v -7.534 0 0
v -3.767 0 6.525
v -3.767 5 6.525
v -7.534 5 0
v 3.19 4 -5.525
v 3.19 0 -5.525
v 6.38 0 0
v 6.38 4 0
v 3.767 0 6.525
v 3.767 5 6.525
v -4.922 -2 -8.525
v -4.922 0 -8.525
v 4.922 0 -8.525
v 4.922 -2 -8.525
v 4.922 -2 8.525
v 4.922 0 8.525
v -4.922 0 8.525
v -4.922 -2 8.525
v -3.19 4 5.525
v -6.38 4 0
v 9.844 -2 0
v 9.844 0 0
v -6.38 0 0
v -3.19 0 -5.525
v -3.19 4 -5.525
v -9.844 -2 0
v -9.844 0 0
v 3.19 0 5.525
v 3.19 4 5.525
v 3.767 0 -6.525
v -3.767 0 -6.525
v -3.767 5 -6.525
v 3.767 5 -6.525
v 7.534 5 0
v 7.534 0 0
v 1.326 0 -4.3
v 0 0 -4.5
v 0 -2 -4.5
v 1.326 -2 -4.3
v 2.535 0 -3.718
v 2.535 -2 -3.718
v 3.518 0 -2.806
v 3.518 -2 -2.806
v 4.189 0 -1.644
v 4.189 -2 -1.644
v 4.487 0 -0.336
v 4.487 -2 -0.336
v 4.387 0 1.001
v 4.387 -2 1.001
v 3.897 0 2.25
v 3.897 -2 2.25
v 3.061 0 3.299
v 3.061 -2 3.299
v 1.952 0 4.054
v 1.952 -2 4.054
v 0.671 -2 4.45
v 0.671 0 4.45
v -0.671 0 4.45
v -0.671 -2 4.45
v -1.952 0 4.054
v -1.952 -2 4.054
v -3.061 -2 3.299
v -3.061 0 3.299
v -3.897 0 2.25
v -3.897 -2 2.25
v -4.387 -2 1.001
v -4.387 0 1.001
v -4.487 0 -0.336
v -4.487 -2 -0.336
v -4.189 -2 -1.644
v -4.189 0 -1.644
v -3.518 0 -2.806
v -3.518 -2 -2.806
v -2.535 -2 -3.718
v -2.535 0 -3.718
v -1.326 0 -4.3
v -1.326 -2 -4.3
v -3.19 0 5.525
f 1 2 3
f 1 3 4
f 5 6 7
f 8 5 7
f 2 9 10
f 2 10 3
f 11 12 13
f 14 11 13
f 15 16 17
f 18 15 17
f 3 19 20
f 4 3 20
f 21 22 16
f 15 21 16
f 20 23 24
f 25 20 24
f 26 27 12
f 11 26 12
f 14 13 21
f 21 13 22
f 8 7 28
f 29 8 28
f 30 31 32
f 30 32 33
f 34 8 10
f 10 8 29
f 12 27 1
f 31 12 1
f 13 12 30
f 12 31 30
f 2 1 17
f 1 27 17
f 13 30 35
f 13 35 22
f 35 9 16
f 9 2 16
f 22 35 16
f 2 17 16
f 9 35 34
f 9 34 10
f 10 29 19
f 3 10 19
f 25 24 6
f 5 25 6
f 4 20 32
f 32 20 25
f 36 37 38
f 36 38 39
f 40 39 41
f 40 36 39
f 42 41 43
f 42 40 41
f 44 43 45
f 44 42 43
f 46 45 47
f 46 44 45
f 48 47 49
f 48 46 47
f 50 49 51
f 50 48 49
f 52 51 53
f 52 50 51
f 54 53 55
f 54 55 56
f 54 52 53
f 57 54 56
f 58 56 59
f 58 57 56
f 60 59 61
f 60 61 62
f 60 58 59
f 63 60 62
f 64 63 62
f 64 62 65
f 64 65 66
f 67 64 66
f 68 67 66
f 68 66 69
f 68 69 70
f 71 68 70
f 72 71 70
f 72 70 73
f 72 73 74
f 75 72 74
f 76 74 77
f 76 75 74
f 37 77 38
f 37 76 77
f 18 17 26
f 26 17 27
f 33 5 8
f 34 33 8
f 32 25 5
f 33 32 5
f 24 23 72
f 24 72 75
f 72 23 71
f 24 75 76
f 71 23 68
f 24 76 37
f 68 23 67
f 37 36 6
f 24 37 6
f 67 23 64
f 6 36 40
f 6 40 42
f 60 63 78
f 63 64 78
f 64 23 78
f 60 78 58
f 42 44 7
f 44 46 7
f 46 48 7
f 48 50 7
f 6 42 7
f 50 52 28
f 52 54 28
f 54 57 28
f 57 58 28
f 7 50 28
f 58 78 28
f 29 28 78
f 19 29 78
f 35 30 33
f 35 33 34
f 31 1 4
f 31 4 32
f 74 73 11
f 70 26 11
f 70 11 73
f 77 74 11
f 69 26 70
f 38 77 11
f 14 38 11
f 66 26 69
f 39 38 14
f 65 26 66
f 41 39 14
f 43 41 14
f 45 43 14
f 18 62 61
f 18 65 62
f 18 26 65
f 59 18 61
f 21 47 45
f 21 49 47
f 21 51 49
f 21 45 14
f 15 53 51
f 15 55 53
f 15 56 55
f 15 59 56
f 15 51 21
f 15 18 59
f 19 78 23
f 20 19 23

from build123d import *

# Parameters (mm, degrees)
SKETCH2_R           = 4.5
BOSS_EXTRUDE1_DEPTH = 2
BOSS_EXTRUDE2_DEPTH = 5
CHAMFER1_SIZE       = 1


with BuildPart() as part:
    # Sketch2 → Boss-Extrude1 (new body)
    with BuildSketch(Plane.XZ):
        Polygon((-4.921911045, -8.525), (4.921911045, -8.525), (9.84382209, 0), (4.921911045, 8.525), (-4.921911045, 8.525), (-9.84382209, 0), align=None)
        with Locations(Location((0, 0, 0), (0, 0, 270))):
            Circle(SKETCH2_R, mode=Mode.SUBTRACT)
    extrude(amount=BOSS_EXTRUDE1_DEPTH)

    # Sketch3 → Boss-Extrude2 (add)
    with BuildSketch(Plane.XZ):
        Polygon((7.534421013, 0), (3.767210506, 6.525), (-3.767210506, 6.525), (-7.534421013, 0), (-3.767210506, -6.525), (3.767210506, -6.525), align=None)
        Polygon((3.189860237, 5.525), (-3.189860237, 5.525), (-6.379720475, 0), (-3.189860237, -5.525), (3.189860237, -5.525), (6.379720475, 0), align=None, mode=Mode.SUBTRACT)
    extrude(amount=-BOSS_EXTRUDE2_DEPTH)

    # Chamfer1
    chamfer1_edges = [part.edges().sort_by_distance(p)[0] for p in [
        (4.784790356, 5, -2.7625),
        (4.784790356, 5, 2.7625),
        (0, 5, 5.525),
        (-4.784790356, 5, 2.7625),
        (-4.784790356, 5, -2.7625),
        (0, 5, -5.525),
    ]]
    chamfer(chamfer1_edges, length=CHAMFER1_SIZE - 0.0001)  # a hair under: the kernel refuses the full size


solid = part.part
